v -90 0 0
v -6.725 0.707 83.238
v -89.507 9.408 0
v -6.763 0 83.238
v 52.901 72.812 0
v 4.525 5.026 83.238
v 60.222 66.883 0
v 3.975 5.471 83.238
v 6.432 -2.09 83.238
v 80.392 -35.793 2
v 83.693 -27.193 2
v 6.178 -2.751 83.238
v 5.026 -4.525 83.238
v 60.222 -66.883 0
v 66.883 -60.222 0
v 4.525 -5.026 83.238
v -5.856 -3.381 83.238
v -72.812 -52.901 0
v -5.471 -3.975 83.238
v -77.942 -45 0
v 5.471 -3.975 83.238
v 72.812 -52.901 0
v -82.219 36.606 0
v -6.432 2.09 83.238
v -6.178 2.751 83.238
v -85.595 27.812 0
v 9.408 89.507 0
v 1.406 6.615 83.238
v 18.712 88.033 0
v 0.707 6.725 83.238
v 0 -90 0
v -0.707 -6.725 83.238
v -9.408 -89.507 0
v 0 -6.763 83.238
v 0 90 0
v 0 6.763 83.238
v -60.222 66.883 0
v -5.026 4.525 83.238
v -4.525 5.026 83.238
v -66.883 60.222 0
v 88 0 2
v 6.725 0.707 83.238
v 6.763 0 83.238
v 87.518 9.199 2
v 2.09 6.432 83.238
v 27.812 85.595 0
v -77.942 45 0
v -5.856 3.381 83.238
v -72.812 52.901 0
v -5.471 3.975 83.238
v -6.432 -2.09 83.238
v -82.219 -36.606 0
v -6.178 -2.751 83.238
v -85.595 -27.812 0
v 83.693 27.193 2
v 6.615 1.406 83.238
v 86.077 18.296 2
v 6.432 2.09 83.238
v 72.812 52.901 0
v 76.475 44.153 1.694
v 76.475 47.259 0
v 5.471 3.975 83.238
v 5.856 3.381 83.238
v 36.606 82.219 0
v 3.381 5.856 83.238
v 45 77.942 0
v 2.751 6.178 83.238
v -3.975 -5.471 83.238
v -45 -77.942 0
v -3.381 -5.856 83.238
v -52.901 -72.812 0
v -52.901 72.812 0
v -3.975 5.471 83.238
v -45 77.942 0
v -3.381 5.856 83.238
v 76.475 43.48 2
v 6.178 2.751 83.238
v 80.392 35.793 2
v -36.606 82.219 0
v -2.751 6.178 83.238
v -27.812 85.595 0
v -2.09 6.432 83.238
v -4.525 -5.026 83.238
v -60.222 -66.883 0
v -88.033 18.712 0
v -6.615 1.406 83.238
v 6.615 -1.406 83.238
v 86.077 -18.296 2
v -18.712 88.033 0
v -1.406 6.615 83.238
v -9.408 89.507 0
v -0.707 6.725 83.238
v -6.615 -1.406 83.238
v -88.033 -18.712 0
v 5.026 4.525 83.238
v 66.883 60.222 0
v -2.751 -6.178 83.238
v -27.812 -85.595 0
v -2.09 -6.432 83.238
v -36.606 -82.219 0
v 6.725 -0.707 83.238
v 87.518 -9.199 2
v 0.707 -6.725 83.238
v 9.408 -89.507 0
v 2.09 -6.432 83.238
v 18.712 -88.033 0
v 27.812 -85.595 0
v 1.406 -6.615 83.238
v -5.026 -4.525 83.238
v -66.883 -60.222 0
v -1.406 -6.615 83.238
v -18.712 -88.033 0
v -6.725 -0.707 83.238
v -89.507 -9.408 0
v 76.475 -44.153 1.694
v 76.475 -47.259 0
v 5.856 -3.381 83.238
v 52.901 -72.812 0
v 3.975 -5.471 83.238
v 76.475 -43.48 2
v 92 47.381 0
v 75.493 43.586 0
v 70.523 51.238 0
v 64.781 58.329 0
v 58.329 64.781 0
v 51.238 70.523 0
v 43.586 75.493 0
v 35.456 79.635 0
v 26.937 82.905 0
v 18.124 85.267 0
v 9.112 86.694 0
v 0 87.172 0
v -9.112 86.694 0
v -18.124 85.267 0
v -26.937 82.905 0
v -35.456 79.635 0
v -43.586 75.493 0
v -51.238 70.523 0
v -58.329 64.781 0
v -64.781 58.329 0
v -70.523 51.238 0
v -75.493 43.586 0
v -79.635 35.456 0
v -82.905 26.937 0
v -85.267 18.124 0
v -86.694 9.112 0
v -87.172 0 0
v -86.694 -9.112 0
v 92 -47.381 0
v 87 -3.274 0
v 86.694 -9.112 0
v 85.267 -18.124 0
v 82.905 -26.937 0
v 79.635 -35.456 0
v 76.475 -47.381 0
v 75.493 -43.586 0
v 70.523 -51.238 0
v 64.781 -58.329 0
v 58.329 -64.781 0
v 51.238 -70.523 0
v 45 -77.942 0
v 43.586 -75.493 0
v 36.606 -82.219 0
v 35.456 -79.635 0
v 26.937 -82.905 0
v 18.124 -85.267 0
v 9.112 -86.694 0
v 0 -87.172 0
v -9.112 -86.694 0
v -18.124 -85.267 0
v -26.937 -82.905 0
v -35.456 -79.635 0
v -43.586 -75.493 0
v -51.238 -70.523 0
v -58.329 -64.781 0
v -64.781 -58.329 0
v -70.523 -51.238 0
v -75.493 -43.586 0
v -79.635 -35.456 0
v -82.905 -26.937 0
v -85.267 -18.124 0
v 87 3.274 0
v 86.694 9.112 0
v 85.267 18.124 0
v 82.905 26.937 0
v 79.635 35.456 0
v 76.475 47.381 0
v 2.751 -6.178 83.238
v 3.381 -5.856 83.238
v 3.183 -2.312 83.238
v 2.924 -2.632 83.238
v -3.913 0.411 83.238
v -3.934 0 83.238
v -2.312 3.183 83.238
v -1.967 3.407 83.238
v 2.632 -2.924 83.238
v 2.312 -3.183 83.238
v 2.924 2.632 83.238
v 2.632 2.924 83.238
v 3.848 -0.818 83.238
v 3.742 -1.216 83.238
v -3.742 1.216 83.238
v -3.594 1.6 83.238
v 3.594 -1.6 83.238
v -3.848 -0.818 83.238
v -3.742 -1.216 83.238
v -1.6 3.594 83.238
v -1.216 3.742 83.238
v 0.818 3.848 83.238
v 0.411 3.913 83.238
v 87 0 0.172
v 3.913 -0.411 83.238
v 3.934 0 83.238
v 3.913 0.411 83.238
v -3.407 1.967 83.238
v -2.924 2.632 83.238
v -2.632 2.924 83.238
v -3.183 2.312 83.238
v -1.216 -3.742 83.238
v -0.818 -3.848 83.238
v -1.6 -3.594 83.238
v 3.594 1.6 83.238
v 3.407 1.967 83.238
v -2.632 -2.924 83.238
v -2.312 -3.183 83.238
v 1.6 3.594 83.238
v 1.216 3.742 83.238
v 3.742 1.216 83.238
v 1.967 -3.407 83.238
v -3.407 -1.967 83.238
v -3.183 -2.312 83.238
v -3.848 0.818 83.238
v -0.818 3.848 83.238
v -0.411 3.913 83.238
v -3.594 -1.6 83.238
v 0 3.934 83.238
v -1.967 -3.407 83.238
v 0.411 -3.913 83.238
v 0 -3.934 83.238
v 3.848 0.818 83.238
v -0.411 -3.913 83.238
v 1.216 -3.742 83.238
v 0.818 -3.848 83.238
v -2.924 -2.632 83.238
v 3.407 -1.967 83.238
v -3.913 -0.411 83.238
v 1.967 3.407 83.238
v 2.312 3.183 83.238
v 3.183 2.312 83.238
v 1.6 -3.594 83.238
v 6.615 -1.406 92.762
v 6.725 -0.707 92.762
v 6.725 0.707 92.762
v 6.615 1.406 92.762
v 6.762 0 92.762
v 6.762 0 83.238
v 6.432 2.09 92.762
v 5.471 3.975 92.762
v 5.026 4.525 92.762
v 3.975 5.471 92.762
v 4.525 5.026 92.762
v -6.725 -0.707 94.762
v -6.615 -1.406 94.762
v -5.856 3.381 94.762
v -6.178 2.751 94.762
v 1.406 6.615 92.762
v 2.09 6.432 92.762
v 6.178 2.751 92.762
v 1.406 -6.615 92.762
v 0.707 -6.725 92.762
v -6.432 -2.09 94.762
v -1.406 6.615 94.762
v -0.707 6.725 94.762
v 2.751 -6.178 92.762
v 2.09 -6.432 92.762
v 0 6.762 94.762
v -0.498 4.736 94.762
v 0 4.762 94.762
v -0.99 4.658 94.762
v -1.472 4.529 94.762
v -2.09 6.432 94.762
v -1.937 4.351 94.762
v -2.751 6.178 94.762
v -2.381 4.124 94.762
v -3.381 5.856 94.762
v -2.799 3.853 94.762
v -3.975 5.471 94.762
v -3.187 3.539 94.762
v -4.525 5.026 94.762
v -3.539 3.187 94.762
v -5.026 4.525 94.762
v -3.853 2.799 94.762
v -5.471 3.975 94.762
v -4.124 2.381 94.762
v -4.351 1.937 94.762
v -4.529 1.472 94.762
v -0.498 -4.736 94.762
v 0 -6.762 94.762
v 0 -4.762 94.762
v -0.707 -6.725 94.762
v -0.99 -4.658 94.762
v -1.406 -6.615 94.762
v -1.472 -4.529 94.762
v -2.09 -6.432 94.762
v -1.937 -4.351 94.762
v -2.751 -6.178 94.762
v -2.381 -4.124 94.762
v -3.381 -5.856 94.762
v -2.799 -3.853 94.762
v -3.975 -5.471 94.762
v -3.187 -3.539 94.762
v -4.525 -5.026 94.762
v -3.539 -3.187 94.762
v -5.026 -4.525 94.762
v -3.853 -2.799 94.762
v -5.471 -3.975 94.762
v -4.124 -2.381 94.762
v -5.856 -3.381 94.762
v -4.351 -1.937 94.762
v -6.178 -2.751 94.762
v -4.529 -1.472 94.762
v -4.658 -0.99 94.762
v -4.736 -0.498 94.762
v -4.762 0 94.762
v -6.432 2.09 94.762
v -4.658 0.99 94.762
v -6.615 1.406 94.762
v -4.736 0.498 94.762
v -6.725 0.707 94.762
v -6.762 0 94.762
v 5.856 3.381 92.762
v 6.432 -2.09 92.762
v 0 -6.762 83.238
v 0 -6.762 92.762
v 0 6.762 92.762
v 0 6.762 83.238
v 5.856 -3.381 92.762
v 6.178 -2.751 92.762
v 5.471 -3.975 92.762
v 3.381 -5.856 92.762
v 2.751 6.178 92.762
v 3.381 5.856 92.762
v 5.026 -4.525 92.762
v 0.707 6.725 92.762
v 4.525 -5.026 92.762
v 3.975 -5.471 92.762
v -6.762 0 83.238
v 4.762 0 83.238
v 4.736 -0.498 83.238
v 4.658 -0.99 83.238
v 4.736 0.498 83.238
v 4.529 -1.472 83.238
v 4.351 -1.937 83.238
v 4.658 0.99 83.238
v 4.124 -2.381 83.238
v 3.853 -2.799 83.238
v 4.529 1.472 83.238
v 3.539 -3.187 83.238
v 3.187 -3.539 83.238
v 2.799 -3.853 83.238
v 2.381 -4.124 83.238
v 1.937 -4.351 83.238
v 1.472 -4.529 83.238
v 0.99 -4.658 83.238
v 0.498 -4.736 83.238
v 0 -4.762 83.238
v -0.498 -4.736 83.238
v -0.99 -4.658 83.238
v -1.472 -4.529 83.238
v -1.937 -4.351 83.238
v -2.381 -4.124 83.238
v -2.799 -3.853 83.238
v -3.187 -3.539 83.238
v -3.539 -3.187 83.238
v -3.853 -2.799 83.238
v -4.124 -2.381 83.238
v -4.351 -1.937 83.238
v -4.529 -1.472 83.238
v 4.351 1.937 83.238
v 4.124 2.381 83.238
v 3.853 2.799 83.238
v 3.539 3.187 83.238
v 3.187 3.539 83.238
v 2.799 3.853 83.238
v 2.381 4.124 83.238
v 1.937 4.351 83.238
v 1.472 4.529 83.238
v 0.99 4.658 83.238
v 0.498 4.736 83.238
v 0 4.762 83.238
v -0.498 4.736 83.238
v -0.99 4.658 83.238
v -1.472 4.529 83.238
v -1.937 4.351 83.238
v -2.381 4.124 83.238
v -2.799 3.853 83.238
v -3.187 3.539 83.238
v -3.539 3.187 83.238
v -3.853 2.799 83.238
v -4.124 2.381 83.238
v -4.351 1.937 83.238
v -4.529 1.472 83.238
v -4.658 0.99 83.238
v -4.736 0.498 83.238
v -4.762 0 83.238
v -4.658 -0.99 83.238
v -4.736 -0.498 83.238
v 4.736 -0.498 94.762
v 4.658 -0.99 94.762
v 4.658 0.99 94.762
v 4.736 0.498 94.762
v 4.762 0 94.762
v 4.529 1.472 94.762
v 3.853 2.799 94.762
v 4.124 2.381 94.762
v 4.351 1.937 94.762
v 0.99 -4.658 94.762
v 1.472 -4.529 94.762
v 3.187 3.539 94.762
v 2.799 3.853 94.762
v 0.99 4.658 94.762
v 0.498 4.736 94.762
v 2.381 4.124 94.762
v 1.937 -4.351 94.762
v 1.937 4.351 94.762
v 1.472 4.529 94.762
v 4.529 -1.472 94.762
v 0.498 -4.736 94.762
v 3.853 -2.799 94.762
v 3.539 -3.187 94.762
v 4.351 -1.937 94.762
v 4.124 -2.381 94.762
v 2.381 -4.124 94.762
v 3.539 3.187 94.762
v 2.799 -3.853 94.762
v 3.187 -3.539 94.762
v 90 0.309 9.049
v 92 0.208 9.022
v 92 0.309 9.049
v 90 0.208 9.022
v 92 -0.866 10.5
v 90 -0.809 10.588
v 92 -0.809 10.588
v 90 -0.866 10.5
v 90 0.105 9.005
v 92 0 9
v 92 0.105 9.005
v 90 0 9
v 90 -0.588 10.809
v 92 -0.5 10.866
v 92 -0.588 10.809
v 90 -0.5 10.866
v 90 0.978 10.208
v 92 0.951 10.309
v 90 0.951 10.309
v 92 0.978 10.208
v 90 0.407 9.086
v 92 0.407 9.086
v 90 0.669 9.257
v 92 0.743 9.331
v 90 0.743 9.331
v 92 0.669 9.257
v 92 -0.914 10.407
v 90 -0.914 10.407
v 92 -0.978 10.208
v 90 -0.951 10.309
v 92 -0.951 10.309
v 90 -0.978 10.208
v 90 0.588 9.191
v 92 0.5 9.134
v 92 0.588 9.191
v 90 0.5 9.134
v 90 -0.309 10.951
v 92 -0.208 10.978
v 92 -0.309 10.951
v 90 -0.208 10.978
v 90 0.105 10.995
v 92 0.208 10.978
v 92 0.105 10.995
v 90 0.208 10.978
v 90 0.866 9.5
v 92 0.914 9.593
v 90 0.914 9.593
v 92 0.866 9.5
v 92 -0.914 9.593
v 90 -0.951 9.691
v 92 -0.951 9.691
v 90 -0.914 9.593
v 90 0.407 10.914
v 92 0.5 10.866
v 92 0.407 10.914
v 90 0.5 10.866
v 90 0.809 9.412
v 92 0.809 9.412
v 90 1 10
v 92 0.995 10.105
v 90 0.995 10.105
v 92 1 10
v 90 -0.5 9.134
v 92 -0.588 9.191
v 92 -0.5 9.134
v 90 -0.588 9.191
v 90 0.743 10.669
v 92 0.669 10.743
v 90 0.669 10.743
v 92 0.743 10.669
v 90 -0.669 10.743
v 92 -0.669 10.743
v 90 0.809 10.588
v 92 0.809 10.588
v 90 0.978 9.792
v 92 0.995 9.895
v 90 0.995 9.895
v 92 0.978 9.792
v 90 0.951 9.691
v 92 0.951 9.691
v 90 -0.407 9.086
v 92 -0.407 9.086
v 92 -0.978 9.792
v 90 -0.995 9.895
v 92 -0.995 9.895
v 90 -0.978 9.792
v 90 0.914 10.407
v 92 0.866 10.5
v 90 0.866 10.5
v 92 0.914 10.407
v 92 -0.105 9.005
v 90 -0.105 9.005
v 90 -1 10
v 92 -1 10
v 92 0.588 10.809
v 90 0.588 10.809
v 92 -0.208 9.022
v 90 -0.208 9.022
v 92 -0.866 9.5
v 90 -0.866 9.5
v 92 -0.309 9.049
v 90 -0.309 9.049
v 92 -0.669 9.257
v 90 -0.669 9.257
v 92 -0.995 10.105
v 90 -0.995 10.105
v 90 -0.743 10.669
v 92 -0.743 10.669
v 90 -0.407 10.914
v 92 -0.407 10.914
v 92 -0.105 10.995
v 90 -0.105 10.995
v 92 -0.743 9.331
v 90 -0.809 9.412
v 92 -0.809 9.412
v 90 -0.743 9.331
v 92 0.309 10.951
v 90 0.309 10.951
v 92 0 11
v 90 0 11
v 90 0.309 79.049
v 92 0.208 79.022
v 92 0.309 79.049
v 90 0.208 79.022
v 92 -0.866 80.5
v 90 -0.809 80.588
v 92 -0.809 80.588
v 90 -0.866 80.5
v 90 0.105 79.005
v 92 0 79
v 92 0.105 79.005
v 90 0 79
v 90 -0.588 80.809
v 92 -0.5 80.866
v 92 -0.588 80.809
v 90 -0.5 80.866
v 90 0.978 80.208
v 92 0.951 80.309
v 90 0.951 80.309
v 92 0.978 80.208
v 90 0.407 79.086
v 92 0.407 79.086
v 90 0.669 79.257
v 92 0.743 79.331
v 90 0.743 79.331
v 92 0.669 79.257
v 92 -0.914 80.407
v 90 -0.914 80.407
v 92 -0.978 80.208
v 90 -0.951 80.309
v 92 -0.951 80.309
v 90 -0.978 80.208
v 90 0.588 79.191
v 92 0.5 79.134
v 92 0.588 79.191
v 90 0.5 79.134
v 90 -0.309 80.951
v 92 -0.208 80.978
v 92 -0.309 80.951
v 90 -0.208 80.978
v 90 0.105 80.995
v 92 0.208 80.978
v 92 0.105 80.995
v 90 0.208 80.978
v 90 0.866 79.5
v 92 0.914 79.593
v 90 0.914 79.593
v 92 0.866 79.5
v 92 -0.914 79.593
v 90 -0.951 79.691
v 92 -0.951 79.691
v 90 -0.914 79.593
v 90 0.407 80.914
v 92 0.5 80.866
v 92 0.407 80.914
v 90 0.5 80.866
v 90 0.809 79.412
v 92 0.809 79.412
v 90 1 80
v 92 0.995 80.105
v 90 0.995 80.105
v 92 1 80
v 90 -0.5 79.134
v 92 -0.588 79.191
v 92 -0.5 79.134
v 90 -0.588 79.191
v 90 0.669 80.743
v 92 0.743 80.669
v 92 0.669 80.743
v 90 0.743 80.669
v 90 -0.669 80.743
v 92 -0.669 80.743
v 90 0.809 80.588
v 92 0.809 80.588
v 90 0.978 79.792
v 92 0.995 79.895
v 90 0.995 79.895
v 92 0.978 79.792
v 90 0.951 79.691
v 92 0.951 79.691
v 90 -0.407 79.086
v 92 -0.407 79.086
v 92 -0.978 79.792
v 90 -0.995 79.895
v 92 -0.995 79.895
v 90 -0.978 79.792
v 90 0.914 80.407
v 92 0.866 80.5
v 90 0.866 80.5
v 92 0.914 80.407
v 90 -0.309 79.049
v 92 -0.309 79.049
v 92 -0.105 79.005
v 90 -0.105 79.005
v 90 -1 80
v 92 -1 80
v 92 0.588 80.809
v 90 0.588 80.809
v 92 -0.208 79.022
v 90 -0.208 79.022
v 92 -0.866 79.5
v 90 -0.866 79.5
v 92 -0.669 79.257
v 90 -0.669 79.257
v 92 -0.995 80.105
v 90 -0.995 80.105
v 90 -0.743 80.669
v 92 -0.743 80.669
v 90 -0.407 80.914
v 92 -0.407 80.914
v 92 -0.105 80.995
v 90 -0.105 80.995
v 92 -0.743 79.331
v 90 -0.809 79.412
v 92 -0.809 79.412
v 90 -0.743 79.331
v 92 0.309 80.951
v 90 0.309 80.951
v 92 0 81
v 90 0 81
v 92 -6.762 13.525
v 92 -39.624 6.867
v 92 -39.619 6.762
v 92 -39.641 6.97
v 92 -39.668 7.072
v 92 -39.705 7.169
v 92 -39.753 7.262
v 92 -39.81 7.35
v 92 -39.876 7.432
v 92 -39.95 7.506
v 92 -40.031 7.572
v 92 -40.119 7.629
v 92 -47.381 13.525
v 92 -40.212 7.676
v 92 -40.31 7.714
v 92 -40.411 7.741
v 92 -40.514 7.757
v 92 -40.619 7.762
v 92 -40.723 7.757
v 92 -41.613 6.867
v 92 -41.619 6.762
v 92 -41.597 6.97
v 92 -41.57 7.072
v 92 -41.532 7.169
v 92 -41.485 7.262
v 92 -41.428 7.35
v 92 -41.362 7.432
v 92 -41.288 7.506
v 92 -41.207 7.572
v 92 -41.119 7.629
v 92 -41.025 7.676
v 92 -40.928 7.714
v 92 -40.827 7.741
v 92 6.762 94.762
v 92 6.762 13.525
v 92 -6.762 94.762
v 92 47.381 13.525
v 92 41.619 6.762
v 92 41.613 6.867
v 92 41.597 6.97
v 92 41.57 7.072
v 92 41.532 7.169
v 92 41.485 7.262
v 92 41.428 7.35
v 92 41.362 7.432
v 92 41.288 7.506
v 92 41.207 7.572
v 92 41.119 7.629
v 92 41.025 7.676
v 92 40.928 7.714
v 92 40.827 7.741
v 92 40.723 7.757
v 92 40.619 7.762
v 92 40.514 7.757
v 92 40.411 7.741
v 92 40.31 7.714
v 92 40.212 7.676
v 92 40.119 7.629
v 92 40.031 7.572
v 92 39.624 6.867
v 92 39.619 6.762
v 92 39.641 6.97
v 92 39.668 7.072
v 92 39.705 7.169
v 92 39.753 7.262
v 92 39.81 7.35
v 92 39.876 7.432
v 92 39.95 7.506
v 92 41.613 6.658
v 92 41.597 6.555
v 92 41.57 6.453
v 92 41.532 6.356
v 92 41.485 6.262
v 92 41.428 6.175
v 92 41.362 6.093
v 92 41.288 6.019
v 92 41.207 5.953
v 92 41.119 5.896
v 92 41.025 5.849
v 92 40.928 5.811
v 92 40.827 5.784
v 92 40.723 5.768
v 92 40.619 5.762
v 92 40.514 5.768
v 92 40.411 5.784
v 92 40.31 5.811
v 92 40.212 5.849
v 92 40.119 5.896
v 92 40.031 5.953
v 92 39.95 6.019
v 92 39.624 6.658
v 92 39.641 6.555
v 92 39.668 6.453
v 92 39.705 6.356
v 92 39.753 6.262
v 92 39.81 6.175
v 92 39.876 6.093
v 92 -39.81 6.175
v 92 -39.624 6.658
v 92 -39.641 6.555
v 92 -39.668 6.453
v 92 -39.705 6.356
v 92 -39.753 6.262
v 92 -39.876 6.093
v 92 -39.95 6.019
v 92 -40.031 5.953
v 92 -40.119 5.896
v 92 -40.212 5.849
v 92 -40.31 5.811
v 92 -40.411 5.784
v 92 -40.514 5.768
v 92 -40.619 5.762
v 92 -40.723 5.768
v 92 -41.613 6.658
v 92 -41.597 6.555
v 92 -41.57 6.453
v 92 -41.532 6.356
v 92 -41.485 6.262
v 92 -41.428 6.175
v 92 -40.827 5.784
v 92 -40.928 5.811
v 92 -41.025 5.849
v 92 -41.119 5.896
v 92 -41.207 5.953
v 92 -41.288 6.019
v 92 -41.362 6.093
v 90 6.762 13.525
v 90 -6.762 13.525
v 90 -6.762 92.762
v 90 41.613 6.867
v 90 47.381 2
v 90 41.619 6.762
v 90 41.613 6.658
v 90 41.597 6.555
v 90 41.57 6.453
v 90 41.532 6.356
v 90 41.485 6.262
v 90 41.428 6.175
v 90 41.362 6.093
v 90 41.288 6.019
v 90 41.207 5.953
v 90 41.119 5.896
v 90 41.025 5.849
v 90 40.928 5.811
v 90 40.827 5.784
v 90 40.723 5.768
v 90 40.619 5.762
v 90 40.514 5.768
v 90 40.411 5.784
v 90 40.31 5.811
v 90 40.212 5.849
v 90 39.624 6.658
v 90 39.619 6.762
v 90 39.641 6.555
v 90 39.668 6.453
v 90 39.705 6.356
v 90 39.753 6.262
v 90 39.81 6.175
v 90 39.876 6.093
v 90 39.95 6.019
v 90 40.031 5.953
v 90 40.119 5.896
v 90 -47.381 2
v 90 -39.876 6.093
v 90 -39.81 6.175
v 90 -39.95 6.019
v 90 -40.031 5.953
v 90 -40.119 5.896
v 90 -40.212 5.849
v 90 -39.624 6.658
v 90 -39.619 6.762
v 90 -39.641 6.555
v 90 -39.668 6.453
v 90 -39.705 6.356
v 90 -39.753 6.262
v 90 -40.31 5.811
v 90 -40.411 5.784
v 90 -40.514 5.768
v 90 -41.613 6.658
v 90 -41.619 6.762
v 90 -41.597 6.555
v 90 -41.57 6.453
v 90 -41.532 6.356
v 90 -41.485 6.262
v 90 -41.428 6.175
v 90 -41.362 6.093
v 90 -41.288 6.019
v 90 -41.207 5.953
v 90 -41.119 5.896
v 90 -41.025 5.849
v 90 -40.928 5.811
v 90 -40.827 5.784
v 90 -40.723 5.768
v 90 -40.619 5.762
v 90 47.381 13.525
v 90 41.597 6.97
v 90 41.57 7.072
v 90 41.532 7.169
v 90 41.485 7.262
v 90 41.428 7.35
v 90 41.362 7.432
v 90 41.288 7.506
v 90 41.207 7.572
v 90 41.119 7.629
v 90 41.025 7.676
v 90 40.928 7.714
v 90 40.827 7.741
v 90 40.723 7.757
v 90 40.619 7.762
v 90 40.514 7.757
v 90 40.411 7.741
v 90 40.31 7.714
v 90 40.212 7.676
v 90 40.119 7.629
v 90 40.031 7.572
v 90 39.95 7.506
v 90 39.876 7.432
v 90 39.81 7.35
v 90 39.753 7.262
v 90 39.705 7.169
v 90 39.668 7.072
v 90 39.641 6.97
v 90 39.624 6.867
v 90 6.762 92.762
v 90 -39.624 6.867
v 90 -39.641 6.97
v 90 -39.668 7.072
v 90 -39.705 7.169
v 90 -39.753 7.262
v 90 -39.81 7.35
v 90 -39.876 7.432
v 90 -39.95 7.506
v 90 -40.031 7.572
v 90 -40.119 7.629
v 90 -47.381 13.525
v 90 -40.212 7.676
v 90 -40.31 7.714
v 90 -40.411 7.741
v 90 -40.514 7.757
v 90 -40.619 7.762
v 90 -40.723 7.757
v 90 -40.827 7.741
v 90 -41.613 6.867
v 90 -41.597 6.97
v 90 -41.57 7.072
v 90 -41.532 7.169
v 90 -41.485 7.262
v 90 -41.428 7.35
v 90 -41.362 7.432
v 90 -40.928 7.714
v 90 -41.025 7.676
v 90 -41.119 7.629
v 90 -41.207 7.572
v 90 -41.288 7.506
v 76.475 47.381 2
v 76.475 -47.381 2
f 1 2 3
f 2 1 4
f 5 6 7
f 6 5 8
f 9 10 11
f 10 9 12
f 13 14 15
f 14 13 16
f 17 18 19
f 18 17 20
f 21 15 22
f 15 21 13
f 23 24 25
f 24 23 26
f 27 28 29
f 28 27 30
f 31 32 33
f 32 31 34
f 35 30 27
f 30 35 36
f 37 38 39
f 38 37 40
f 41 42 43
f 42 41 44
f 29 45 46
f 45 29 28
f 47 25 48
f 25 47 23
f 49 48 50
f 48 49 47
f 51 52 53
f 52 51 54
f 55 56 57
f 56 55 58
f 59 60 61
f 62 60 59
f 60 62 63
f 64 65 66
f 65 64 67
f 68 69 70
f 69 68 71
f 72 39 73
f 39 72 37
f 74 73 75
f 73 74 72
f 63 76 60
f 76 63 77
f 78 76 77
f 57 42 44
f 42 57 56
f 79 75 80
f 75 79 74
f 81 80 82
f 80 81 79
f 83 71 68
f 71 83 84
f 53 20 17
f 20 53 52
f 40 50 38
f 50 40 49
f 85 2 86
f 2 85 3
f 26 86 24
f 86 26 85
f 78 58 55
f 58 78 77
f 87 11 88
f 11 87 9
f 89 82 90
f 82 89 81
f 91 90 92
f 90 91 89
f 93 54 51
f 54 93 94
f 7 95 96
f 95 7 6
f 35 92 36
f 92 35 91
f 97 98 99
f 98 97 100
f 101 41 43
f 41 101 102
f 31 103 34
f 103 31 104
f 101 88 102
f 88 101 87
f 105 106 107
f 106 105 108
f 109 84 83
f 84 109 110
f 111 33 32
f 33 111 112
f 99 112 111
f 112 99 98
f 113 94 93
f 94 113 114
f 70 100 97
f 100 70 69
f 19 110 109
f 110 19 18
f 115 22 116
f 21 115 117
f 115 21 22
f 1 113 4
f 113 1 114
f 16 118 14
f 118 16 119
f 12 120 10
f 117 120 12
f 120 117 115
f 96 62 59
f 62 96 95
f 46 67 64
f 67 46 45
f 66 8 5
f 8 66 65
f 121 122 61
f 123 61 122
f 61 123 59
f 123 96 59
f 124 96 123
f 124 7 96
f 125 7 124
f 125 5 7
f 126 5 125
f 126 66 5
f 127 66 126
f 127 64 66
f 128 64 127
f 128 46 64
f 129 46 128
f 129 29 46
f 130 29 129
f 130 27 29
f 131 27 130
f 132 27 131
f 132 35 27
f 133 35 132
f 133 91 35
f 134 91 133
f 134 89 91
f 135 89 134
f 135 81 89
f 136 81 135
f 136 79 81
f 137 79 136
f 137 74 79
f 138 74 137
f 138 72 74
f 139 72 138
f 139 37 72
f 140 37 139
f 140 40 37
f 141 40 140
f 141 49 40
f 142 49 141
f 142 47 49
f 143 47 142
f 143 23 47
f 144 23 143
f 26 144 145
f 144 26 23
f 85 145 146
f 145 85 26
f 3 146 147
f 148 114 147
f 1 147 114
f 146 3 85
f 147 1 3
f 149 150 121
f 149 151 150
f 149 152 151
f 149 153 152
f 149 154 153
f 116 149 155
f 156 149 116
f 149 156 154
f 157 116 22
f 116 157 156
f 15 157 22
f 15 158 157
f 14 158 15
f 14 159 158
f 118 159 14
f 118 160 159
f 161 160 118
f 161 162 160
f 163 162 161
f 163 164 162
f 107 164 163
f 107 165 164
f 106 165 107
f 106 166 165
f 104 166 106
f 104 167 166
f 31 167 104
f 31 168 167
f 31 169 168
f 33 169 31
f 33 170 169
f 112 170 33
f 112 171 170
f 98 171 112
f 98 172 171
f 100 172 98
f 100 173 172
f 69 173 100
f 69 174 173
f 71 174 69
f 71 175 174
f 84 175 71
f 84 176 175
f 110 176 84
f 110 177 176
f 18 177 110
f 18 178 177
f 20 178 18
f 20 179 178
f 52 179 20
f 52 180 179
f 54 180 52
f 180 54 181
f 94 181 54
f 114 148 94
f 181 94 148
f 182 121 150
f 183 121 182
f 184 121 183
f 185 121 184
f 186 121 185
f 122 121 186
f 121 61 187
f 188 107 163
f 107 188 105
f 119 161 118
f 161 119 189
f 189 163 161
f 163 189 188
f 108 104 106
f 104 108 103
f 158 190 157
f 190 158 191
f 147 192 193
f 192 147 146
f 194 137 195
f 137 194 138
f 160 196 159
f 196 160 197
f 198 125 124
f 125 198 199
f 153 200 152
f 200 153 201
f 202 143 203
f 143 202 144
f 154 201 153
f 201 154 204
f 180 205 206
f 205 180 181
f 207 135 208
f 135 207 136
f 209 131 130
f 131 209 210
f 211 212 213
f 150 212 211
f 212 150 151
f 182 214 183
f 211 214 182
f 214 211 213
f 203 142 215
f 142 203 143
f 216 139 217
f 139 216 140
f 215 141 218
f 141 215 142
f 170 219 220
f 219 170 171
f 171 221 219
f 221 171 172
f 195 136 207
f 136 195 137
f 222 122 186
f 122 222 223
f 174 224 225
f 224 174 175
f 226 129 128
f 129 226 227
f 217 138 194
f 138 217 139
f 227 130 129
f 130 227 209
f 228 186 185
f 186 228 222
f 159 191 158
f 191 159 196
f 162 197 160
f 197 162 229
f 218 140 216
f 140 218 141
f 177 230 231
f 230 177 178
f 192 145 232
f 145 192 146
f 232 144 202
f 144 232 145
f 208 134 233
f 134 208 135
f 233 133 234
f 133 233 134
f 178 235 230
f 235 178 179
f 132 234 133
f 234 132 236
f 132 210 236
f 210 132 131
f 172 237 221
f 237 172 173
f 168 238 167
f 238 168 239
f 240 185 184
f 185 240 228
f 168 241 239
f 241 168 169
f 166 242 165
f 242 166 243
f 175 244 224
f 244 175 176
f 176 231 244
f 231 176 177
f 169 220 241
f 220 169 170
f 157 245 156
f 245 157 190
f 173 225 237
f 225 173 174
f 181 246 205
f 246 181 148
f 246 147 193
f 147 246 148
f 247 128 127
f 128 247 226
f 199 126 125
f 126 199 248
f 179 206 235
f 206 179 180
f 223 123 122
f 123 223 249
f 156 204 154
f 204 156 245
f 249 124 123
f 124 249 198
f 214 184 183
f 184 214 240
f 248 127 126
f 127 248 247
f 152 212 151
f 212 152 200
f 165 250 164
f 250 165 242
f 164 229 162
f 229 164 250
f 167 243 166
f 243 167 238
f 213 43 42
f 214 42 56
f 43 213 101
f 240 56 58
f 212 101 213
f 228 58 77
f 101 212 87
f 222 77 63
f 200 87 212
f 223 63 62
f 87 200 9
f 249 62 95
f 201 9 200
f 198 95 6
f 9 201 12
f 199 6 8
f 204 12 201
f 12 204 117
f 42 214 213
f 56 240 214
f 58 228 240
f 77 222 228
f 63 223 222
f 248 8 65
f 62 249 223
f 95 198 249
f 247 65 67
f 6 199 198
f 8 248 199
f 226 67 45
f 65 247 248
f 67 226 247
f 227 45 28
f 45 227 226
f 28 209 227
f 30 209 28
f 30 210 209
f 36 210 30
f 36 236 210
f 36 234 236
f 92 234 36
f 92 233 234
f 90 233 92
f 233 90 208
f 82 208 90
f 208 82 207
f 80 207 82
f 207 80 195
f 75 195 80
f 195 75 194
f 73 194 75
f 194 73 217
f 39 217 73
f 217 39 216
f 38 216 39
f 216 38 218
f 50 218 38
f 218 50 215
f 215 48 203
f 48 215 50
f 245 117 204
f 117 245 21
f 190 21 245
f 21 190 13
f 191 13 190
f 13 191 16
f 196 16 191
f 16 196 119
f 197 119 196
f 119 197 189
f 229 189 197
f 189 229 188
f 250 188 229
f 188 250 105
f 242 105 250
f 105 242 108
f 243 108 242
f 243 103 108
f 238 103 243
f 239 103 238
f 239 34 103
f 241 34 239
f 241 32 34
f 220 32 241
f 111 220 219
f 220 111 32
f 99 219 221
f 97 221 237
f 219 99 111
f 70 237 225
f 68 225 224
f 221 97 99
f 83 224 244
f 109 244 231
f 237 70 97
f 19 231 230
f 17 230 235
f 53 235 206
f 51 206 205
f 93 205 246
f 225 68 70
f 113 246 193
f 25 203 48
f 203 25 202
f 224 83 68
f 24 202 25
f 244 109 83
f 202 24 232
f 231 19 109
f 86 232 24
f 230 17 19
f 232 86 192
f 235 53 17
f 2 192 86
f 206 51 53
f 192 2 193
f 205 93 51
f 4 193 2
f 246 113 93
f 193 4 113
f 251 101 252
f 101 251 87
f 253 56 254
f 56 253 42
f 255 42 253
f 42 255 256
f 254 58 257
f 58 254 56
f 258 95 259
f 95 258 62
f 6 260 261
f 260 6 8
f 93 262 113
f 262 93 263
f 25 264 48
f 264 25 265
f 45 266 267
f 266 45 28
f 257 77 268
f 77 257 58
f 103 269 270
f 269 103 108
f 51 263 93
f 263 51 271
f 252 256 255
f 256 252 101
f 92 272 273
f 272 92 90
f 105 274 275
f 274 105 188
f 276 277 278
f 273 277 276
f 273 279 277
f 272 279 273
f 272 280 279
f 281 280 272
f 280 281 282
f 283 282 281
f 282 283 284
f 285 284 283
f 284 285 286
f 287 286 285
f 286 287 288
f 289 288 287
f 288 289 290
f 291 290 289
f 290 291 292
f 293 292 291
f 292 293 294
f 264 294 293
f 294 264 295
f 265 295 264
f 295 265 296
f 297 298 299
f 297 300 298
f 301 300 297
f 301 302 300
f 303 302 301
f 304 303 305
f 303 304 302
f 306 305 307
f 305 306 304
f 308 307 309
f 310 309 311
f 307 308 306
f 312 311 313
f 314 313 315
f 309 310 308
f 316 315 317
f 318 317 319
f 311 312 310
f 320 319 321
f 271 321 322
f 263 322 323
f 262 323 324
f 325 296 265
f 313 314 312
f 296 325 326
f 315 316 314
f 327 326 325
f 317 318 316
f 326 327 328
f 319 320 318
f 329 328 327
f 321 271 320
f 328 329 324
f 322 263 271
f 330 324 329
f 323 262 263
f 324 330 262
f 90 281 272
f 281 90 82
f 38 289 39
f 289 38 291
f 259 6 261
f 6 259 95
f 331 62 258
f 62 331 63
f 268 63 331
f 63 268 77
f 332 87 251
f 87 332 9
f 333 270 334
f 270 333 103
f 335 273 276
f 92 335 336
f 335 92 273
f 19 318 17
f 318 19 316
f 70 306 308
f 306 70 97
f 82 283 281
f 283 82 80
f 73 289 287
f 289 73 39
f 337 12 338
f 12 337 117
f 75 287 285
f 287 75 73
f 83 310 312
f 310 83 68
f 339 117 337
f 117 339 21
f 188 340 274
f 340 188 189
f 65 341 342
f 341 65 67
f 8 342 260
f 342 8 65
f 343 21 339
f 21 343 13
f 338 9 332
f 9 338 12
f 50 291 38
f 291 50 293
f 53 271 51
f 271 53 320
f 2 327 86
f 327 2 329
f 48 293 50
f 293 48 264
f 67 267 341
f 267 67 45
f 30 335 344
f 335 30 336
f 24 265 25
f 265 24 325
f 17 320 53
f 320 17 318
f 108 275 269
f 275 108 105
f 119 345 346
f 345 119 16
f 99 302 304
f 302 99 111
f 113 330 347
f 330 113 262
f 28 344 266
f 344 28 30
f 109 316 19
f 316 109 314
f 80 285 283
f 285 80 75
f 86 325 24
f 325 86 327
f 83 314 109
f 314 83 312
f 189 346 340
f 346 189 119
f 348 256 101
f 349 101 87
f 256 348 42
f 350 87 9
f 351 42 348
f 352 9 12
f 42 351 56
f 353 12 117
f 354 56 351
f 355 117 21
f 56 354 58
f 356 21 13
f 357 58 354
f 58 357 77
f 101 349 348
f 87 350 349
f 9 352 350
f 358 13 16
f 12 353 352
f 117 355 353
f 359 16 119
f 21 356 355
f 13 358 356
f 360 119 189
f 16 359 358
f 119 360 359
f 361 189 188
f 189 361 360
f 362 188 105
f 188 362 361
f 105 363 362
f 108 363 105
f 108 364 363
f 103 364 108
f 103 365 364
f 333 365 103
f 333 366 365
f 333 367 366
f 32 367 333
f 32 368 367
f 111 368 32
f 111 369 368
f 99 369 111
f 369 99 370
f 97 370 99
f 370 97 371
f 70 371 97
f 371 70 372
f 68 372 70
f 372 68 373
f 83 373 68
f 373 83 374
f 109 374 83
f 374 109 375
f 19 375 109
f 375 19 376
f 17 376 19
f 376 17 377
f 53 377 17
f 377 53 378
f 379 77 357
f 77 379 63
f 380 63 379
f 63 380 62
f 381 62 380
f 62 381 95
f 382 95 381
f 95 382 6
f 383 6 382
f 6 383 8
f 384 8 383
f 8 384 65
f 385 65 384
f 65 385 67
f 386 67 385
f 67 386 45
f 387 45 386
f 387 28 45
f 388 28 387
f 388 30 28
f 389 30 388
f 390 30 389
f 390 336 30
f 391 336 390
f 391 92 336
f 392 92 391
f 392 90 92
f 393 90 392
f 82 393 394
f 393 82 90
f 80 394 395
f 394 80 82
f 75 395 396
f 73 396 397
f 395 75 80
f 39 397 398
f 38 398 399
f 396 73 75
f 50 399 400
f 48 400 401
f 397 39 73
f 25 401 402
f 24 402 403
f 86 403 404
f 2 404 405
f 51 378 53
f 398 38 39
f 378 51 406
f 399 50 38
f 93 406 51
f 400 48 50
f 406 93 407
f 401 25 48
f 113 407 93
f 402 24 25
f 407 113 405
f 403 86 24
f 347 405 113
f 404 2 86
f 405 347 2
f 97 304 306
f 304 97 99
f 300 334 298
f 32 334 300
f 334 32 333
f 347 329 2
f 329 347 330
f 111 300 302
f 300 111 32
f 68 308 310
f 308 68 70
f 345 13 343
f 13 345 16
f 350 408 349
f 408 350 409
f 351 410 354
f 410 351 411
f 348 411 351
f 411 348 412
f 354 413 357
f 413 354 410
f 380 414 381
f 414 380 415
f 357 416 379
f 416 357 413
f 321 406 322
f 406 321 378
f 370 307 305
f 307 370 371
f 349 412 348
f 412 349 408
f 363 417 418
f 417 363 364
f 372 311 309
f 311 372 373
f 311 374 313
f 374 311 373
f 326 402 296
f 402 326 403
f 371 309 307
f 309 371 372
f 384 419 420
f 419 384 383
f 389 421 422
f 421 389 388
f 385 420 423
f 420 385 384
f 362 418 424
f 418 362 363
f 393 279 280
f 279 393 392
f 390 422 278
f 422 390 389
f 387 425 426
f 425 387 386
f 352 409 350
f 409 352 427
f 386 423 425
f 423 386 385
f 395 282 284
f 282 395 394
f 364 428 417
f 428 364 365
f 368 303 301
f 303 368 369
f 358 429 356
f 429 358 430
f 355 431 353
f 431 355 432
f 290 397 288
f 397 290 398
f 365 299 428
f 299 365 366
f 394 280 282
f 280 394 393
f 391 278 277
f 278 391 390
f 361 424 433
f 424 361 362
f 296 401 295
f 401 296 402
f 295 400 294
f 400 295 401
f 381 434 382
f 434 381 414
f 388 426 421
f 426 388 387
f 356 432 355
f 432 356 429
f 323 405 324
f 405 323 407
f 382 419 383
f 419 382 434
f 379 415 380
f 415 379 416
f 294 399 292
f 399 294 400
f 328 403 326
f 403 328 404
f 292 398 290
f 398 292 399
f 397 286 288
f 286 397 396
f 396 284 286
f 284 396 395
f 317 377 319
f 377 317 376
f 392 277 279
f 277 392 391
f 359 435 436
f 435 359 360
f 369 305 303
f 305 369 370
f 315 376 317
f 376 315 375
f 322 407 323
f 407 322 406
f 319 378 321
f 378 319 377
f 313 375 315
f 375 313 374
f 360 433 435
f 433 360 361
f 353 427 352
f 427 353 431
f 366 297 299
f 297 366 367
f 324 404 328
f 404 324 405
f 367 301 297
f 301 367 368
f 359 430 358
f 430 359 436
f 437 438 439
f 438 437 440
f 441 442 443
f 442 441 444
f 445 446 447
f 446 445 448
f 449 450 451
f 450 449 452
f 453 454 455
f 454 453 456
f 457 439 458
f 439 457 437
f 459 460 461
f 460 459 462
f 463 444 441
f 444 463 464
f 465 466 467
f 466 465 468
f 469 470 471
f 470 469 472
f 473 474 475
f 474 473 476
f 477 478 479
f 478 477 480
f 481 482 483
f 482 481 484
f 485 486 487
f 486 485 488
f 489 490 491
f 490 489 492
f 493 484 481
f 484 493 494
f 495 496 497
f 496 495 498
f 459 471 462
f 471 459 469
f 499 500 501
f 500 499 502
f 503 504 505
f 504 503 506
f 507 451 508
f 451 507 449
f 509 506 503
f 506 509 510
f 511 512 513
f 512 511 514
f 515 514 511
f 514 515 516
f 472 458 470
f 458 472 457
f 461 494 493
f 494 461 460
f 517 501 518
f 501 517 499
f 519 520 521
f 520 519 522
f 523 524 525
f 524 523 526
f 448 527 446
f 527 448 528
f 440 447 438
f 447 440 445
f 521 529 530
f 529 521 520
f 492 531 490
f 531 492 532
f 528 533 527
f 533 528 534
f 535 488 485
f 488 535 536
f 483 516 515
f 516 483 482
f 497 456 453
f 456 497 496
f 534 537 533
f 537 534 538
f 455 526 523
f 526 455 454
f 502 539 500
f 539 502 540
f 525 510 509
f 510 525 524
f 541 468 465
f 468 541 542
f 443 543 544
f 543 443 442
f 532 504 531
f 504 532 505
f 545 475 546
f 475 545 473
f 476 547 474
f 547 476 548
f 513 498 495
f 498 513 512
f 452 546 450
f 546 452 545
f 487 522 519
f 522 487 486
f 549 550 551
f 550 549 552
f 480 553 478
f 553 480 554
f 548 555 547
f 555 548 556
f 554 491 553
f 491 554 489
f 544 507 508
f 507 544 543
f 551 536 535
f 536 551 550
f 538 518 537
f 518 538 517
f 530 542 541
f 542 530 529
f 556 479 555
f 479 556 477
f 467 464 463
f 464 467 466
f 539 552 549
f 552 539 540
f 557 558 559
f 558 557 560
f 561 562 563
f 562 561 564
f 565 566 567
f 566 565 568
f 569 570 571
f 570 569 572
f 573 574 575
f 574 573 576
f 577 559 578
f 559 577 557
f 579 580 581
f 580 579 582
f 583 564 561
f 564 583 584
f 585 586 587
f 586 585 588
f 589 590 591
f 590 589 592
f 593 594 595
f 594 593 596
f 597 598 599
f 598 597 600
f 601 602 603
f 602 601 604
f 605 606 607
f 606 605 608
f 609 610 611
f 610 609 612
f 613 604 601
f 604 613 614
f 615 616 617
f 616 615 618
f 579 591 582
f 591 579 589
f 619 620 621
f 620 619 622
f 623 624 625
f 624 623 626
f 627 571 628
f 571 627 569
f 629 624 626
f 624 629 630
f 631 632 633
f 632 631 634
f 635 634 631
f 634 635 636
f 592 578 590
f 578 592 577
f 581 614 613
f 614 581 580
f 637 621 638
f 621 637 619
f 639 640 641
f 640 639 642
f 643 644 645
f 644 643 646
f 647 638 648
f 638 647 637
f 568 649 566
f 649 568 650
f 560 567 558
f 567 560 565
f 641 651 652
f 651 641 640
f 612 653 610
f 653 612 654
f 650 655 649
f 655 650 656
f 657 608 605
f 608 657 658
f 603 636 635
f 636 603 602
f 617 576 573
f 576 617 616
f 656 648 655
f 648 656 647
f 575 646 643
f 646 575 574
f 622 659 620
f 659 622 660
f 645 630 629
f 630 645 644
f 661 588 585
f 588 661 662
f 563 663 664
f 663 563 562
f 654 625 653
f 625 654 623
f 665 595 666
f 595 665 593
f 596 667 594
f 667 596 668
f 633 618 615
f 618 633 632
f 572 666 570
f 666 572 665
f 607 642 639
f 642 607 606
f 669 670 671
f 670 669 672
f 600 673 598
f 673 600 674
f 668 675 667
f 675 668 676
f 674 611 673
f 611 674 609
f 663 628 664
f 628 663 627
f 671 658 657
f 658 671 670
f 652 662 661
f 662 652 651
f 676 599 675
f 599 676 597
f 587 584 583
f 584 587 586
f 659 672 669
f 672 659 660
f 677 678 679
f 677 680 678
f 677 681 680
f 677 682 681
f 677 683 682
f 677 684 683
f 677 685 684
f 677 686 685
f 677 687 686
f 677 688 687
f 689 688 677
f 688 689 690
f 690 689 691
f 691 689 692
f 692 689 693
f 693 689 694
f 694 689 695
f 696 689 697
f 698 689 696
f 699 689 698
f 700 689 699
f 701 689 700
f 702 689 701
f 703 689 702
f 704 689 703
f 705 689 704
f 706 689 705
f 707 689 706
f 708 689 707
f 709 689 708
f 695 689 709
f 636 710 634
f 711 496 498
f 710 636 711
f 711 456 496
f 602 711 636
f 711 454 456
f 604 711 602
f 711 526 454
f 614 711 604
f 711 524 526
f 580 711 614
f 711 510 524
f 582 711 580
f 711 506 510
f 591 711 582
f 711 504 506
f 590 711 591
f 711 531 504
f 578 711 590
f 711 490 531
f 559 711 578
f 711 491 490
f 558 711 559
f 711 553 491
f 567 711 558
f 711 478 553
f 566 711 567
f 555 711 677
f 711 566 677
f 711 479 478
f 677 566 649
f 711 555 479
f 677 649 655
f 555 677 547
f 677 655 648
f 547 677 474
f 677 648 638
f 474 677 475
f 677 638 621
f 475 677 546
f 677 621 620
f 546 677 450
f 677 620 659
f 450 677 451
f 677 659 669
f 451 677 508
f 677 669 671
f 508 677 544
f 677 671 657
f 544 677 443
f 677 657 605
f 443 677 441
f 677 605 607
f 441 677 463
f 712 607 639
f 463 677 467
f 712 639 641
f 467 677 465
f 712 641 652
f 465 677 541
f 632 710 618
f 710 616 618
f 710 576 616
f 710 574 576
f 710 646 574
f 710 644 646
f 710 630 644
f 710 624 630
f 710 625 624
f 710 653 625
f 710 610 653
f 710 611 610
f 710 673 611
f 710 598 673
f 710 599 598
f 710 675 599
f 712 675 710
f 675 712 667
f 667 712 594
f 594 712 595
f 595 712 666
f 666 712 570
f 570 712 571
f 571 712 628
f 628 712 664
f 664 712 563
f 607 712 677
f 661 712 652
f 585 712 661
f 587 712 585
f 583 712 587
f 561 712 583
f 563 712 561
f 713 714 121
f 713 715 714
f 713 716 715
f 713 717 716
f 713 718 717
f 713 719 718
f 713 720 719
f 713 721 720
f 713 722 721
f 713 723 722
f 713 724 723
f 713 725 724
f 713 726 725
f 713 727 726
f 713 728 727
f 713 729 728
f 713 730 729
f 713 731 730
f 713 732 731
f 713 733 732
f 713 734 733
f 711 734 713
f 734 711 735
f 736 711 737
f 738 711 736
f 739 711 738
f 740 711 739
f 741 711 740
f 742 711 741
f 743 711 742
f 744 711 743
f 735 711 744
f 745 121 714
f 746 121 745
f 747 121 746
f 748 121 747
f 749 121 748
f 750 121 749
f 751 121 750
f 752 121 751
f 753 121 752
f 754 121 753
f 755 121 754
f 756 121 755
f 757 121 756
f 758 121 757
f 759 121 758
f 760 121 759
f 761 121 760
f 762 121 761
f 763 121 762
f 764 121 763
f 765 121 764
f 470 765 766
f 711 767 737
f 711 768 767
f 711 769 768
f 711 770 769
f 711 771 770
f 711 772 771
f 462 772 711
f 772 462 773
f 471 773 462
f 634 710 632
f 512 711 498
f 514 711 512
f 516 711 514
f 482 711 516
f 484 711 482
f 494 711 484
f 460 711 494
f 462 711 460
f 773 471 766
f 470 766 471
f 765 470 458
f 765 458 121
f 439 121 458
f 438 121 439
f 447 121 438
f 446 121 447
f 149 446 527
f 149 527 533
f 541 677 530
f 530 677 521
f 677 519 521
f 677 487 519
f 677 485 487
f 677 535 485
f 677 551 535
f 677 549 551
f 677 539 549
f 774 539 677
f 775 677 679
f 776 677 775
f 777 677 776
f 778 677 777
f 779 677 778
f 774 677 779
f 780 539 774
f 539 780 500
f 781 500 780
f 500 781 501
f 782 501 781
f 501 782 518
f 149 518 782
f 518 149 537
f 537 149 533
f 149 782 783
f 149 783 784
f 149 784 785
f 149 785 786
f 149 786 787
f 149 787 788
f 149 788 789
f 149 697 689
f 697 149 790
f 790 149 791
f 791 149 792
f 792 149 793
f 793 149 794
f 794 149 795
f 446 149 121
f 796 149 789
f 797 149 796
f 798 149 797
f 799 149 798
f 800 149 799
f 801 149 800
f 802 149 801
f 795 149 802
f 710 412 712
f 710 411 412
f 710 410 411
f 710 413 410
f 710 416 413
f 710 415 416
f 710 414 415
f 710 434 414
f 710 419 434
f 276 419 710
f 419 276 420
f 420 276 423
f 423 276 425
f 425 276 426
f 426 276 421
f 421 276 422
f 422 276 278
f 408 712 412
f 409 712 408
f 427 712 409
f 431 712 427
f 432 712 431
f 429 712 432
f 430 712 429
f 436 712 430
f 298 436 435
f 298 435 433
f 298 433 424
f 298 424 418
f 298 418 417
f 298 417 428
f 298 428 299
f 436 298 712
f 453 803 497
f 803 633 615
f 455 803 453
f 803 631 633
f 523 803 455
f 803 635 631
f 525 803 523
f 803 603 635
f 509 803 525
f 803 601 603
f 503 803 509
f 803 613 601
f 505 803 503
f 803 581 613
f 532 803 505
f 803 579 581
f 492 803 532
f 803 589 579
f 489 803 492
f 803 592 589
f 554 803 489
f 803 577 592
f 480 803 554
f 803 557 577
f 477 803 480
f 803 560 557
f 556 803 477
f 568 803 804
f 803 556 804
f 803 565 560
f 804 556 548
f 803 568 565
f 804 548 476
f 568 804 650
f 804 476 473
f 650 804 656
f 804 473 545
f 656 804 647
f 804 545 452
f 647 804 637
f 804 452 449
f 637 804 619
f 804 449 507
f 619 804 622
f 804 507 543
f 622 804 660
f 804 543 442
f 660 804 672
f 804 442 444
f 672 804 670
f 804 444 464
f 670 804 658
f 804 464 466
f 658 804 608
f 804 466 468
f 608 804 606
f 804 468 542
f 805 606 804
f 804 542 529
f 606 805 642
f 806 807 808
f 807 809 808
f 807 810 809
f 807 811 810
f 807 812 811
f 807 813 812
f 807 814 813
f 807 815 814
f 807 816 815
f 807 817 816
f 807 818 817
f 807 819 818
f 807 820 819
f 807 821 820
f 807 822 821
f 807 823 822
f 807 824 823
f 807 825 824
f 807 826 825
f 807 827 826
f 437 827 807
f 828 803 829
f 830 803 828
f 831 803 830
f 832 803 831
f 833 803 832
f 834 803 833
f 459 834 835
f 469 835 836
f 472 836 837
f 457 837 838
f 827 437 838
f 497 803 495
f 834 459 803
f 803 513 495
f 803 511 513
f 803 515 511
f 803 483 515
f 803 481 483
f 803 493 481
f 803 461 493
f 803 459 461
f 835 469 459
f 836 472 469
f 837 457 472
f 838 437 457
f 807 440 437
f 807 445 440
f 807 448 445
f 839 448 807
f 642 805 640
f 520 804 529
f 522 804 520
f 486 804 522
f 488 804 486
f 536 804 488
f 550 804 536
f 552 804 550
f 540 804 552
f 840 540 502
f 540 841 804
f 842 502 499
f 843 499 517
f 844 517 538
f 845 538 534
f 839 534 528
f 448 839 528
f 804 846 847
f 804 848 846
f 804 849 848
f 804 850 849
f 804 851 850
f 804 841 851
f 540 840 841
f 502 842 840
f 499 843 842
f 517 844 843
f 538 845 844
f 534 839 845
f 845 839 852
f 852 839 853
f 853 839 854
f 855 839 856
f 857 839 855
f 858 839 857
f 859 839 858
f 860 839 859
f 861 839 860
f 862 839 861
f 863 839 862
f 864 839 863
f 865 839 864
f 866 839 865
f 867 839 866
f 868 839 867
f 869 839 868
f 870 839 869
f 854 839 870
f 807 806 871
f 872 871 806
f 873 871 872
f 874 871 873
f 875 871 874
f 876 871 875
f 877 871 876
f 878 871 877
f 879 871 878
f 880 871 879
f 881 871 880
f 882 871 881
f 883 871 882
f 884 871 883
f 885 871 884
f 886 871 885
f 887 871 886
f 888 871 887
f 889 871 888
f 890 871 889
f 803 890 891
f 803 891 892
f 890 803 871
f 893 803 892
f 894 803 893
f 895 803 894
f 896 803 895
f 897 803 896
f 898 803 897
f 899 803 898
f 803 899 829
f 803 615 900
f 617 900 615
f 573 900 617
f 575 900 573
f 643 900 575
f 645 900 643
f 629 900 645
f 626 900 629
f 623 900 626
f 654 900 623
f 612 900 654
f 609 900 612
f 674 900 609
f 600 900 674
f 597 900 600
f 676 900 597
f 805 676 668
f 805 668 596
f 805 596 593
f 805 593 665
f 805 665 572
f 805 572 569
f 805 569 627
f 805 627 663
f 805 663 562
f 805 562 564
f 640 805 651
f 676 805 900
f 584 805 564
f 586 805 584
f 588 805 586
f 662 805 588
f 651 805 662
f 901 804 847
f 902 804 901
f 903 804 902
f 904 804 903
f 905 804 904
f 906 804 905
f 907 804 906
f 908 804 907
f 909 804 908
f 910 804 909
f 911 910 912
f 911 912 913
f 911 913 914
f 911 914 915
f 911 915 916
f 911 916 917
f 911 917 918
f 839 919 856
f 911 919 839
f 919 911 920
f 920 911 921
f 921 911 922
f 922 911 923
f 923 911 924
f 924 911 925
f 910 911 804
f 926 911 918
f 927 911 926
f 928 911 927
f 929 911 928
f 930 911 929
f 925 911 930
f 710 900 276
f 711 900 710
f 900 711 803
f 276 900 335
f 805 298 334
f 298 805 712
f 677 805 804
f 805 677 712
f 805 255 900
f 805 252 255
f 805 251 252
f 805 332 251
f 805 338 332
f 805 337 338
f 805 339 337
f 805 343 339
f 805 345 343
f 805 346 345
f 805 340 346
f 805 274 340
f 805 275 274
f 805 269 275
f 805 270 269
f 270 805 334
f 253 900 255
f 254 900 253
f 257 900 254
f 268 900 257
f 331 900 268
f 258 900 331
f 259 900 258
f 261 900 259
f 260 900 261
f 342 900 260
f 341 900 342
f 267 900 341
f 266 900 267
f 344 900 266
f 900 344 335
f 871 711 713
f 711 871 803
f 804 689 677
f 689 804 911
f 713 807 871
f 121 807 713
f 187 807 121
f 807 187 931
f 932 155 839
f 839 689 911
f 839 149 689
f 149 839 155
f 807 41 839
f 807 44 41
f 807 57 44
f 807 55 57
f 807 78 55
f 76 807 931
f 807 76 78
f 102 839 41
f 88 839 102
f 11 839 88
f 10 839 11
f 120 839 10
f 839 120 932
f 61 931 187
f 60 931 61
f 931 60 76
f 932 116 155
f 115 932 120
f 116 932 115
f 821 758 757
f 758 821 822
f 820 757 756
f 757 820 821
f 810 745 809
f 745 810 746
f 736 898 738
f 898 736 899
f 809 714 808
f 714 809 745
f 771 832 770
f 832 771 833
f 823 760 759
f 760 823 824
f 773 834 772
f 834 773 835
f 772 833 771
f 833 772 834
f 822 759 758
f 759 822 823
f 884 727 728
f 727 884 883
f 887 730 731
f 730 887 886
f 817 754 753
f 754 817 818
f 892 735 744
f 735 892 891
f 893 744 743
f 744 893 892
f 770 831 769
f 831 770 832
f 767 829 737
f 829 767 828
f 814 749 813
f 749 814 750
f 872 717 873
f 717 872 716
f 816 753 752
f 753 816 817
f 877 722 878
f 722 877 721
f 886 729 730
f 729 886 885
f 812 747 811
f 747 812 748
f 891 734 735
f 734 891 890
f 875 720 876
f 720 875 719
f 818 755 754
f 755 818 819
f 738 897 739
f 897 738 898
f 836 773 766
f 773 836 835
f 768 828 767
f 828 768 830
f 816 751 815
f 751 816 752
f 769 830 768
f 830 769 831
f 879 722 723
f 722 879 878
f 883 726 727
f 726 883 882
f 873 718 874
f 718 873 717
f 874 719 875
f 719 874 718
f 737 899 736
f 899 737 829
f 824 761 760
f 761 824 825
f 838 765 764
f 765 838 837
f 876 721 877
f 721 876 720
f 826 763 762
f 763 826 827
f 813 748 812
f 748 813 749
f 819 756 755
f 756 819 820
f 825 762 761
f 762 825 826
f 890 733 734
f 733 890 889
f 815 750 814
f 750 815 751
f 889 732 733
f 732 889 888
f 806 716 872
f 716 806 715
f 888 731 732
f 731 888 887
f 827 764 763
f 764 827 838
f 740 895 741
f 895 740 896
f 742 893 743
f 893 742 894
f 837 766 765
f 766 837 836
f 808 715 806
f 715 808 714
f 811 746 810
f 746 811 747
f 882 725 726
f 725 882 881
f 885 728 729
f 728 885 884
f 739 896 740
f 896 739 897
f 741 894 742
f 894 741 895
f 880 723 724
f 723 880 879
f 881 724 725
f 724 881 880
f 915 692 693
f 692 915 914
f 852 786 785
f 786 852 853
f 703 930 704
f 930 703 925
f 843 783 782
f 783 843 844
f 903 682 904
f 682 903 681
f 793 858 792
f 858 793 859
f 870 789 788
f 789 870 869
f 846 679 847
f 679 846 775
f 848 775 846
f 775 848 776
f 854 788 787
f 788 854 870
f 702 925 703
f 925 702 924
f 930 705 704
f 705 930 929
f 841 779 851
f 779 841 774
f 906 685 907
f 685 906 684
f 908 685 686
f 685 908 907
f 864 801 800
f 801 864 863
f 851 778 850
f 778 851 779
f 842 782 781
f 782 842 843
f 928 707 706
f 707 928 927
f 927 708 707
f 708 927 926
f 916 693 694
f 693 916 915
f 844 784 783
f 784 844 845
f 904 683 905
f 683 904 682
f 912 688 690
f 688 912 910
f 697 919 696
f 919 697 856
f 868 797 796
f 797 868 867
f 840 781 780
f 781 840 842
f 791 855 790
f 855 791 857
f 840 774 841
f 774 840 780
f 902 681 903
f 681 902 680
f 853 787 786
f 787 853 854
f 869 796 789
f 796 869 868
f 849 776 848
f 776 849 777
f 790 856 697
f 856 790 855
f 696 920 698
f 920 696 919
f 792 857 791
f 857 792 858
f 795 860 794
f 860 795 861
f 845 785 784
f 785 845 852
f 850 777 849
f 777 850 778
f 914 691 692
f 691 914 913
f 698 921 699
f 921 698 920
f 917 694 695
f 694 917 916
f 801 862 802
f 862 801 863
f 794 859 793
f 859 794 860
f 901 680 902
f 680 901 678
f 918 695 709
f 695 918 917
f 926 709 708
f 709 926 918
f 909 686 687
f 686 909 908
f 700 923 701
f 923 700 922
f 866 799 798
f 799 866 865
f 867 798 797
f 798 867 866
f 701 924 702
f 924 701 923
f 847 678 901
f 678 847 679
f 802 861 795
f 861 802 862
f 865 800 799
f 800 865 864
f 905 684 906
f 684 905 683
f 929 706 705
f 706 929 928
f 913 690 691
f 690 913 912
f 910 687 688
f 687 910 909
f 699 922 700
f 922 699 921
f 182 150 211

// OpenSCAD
/**
Run get_deps.sh to clone dependencies into a linked folder in your home directory.
*/

use <deps.link/BOSL/nema_steppers.scad>
use <deps.link/BOSL/joiners.scad>
use <deps.link/BOSL/shapes.scad>
use <deps.link/erhannisScad/misc.scad>
use <deps.link/erhannisScad/auto_lid.scad>
use <deps.link/scadFluidics/common.scad>
use <deps.link/quickfitPlate/blank_plate.scad>
use <deps.link/getriebe/Getriebe.scad>
use <deps.link/gearbox/gearbox.scad>

$FOREVER = 1000;
DUMMY = false;
$fn = DUMMY ? 10 : 60;

IS_RESERVOIR = true;
IS_RESERVOIR_GATE = false;

TUBE_OD = 25.4*(3/8);
TUBE_ID = IS_RESERVOIR ? TUBE_OD : 25.4*(1/4);
WALL = 2;
HEIGHT = IS_RESERVOIR ? 90 : 70;
SPOUT_OD = TUBE_OD+2*WALL;
SPOUT_H = TUBE_OD+WALL;

if (!IS_RESERVOIR_GATE) { // Enums would be nice
  // Funnel
  difference() {
    // Funnel solid
    rotate_extrude() {
      intersection() {
        triangle(height=HEIGHT);
        QXp();
      }
    }
    // Funnel subtraction
    rotate_extrude() {
      intersection() {
        triangle(height=HEIGHT-(sqrt(2)*WALL));
        QXp();
      }
    }
    // Lop off tip, for spout
    tz(HEIGHT-SPOUT_OD/2) OZp();
  }

  // Spout
  tz(HEIGHT-SPOUT_OD/2) difference() {
    cylinder(d=SPOUT_OD, h=SPOUT_H);
    tz(WALL) cylinder(d=TUBE_OD, h=SPOUT_H);
    cylinder(d=TUBE_ID, h=SPOUT_H);
  }

  // Handle
  union() {
    difference() {
      tx(HEIGHT) ty(-SPOUT_OD/2) cube([WALL, SPOUT_OD, HEIGHT-SPOUT_OD/2+SPOUT_H]);
      ctranslate([[0,0,10],[0,0,HEIGHT-10]]) ry(90) cylinder(d=2, h=$FOREVER);
    }
    difference() {
      tx(HEIGHT) ty(-SPOUT_OD/2) mx() tz(HEIGHT-SPOUT_OD/2+SPOUT_H-WALL) cube([HEIGHT, SPOUT_OD, WALL]);
      tz(WALL) cylinder(d=TUBE_OD, h=$FOREVER);
    }
    tx(HEIGHT) ty(-SPOUT_OD/2) mx() cube([1.5*WALL,SPOUT_OD,WALL]);
    if (IS_RESERVOIR) {
      // Handle brace
      difference() {
        union() {
          tx(HEIGHT) ty(-(HEIGHT-SPOUT_OD/2+SPOUT_H)/2) cube([WALL, HEIGHT-SPOUT_OD/2+SPOUT_H, SPOUT_OD]);
          tx(HEIGHT) ty(-(HEIGHT-SPOUT_OD/2+SPOUT_H)/2) ry(-90) cube([WALL, HEIGHT-SPOUT_OD/2+SPOUT_H, SPOUT_OD]);
        }
        // Funnel subtraction
        rotate_extrude() {
          intersection() {
            triangle(height=HEIGHT-(sqrt(2)*WALL));
            QXp();
          }
        }        
        // Mounting holes
        ctranslate([
          [0,0,10],
          [0,0,HEIGHT-10],
          [0,(HEIGHT-SPOUT_OD/2+SPOUT_H)/2-SPOUT_OD/2,SPOUT_OD/2],
          [0,-((HEIGHT-SPOUT_OD/2+SPOUT_H)/2-SPOUT_OD/2),SPOUT_OD/2],
        ]) ry(90) cylinder(d=2, h=$FOREVER);
      }
    }
  }
}

if (IS_RESERVOIR_GATE) color("red") {
  cmirror([0,1,0]) tz(HEIGHT-SPOUT_OD/2+SPOUT_H) {
    difference() {
      ty(-SPOUT_OD/2) cube([50,SPOUT_OD,WALL]);
      tx(50-SPOUT_OD) cylinder(d=SPOUT_OD, h=$FOREVER, center=true);
    }
    cylinder(d=SPOUT_OD,h=WALL);
    tz(-WALL*2) tx(SPOUT_OD/2) ty(SPOUT_OD/2) cube([50-SPOUT_OD/2,WALL,WALL*3]);
    tz(-WALL) ty(SPOUT_OD/2) tx(SPOUT_OD/2) rx(-135) cube([50-SPOUT_OD/2,WALL,WALL]);
    tz(-WALL*2-WALL*3) tx(SPOUT_OD/2+40-SPOUT_OD/2) ty(SPOUT_OD/2) cube([10,WALL,WALL*6]);
  }
}
